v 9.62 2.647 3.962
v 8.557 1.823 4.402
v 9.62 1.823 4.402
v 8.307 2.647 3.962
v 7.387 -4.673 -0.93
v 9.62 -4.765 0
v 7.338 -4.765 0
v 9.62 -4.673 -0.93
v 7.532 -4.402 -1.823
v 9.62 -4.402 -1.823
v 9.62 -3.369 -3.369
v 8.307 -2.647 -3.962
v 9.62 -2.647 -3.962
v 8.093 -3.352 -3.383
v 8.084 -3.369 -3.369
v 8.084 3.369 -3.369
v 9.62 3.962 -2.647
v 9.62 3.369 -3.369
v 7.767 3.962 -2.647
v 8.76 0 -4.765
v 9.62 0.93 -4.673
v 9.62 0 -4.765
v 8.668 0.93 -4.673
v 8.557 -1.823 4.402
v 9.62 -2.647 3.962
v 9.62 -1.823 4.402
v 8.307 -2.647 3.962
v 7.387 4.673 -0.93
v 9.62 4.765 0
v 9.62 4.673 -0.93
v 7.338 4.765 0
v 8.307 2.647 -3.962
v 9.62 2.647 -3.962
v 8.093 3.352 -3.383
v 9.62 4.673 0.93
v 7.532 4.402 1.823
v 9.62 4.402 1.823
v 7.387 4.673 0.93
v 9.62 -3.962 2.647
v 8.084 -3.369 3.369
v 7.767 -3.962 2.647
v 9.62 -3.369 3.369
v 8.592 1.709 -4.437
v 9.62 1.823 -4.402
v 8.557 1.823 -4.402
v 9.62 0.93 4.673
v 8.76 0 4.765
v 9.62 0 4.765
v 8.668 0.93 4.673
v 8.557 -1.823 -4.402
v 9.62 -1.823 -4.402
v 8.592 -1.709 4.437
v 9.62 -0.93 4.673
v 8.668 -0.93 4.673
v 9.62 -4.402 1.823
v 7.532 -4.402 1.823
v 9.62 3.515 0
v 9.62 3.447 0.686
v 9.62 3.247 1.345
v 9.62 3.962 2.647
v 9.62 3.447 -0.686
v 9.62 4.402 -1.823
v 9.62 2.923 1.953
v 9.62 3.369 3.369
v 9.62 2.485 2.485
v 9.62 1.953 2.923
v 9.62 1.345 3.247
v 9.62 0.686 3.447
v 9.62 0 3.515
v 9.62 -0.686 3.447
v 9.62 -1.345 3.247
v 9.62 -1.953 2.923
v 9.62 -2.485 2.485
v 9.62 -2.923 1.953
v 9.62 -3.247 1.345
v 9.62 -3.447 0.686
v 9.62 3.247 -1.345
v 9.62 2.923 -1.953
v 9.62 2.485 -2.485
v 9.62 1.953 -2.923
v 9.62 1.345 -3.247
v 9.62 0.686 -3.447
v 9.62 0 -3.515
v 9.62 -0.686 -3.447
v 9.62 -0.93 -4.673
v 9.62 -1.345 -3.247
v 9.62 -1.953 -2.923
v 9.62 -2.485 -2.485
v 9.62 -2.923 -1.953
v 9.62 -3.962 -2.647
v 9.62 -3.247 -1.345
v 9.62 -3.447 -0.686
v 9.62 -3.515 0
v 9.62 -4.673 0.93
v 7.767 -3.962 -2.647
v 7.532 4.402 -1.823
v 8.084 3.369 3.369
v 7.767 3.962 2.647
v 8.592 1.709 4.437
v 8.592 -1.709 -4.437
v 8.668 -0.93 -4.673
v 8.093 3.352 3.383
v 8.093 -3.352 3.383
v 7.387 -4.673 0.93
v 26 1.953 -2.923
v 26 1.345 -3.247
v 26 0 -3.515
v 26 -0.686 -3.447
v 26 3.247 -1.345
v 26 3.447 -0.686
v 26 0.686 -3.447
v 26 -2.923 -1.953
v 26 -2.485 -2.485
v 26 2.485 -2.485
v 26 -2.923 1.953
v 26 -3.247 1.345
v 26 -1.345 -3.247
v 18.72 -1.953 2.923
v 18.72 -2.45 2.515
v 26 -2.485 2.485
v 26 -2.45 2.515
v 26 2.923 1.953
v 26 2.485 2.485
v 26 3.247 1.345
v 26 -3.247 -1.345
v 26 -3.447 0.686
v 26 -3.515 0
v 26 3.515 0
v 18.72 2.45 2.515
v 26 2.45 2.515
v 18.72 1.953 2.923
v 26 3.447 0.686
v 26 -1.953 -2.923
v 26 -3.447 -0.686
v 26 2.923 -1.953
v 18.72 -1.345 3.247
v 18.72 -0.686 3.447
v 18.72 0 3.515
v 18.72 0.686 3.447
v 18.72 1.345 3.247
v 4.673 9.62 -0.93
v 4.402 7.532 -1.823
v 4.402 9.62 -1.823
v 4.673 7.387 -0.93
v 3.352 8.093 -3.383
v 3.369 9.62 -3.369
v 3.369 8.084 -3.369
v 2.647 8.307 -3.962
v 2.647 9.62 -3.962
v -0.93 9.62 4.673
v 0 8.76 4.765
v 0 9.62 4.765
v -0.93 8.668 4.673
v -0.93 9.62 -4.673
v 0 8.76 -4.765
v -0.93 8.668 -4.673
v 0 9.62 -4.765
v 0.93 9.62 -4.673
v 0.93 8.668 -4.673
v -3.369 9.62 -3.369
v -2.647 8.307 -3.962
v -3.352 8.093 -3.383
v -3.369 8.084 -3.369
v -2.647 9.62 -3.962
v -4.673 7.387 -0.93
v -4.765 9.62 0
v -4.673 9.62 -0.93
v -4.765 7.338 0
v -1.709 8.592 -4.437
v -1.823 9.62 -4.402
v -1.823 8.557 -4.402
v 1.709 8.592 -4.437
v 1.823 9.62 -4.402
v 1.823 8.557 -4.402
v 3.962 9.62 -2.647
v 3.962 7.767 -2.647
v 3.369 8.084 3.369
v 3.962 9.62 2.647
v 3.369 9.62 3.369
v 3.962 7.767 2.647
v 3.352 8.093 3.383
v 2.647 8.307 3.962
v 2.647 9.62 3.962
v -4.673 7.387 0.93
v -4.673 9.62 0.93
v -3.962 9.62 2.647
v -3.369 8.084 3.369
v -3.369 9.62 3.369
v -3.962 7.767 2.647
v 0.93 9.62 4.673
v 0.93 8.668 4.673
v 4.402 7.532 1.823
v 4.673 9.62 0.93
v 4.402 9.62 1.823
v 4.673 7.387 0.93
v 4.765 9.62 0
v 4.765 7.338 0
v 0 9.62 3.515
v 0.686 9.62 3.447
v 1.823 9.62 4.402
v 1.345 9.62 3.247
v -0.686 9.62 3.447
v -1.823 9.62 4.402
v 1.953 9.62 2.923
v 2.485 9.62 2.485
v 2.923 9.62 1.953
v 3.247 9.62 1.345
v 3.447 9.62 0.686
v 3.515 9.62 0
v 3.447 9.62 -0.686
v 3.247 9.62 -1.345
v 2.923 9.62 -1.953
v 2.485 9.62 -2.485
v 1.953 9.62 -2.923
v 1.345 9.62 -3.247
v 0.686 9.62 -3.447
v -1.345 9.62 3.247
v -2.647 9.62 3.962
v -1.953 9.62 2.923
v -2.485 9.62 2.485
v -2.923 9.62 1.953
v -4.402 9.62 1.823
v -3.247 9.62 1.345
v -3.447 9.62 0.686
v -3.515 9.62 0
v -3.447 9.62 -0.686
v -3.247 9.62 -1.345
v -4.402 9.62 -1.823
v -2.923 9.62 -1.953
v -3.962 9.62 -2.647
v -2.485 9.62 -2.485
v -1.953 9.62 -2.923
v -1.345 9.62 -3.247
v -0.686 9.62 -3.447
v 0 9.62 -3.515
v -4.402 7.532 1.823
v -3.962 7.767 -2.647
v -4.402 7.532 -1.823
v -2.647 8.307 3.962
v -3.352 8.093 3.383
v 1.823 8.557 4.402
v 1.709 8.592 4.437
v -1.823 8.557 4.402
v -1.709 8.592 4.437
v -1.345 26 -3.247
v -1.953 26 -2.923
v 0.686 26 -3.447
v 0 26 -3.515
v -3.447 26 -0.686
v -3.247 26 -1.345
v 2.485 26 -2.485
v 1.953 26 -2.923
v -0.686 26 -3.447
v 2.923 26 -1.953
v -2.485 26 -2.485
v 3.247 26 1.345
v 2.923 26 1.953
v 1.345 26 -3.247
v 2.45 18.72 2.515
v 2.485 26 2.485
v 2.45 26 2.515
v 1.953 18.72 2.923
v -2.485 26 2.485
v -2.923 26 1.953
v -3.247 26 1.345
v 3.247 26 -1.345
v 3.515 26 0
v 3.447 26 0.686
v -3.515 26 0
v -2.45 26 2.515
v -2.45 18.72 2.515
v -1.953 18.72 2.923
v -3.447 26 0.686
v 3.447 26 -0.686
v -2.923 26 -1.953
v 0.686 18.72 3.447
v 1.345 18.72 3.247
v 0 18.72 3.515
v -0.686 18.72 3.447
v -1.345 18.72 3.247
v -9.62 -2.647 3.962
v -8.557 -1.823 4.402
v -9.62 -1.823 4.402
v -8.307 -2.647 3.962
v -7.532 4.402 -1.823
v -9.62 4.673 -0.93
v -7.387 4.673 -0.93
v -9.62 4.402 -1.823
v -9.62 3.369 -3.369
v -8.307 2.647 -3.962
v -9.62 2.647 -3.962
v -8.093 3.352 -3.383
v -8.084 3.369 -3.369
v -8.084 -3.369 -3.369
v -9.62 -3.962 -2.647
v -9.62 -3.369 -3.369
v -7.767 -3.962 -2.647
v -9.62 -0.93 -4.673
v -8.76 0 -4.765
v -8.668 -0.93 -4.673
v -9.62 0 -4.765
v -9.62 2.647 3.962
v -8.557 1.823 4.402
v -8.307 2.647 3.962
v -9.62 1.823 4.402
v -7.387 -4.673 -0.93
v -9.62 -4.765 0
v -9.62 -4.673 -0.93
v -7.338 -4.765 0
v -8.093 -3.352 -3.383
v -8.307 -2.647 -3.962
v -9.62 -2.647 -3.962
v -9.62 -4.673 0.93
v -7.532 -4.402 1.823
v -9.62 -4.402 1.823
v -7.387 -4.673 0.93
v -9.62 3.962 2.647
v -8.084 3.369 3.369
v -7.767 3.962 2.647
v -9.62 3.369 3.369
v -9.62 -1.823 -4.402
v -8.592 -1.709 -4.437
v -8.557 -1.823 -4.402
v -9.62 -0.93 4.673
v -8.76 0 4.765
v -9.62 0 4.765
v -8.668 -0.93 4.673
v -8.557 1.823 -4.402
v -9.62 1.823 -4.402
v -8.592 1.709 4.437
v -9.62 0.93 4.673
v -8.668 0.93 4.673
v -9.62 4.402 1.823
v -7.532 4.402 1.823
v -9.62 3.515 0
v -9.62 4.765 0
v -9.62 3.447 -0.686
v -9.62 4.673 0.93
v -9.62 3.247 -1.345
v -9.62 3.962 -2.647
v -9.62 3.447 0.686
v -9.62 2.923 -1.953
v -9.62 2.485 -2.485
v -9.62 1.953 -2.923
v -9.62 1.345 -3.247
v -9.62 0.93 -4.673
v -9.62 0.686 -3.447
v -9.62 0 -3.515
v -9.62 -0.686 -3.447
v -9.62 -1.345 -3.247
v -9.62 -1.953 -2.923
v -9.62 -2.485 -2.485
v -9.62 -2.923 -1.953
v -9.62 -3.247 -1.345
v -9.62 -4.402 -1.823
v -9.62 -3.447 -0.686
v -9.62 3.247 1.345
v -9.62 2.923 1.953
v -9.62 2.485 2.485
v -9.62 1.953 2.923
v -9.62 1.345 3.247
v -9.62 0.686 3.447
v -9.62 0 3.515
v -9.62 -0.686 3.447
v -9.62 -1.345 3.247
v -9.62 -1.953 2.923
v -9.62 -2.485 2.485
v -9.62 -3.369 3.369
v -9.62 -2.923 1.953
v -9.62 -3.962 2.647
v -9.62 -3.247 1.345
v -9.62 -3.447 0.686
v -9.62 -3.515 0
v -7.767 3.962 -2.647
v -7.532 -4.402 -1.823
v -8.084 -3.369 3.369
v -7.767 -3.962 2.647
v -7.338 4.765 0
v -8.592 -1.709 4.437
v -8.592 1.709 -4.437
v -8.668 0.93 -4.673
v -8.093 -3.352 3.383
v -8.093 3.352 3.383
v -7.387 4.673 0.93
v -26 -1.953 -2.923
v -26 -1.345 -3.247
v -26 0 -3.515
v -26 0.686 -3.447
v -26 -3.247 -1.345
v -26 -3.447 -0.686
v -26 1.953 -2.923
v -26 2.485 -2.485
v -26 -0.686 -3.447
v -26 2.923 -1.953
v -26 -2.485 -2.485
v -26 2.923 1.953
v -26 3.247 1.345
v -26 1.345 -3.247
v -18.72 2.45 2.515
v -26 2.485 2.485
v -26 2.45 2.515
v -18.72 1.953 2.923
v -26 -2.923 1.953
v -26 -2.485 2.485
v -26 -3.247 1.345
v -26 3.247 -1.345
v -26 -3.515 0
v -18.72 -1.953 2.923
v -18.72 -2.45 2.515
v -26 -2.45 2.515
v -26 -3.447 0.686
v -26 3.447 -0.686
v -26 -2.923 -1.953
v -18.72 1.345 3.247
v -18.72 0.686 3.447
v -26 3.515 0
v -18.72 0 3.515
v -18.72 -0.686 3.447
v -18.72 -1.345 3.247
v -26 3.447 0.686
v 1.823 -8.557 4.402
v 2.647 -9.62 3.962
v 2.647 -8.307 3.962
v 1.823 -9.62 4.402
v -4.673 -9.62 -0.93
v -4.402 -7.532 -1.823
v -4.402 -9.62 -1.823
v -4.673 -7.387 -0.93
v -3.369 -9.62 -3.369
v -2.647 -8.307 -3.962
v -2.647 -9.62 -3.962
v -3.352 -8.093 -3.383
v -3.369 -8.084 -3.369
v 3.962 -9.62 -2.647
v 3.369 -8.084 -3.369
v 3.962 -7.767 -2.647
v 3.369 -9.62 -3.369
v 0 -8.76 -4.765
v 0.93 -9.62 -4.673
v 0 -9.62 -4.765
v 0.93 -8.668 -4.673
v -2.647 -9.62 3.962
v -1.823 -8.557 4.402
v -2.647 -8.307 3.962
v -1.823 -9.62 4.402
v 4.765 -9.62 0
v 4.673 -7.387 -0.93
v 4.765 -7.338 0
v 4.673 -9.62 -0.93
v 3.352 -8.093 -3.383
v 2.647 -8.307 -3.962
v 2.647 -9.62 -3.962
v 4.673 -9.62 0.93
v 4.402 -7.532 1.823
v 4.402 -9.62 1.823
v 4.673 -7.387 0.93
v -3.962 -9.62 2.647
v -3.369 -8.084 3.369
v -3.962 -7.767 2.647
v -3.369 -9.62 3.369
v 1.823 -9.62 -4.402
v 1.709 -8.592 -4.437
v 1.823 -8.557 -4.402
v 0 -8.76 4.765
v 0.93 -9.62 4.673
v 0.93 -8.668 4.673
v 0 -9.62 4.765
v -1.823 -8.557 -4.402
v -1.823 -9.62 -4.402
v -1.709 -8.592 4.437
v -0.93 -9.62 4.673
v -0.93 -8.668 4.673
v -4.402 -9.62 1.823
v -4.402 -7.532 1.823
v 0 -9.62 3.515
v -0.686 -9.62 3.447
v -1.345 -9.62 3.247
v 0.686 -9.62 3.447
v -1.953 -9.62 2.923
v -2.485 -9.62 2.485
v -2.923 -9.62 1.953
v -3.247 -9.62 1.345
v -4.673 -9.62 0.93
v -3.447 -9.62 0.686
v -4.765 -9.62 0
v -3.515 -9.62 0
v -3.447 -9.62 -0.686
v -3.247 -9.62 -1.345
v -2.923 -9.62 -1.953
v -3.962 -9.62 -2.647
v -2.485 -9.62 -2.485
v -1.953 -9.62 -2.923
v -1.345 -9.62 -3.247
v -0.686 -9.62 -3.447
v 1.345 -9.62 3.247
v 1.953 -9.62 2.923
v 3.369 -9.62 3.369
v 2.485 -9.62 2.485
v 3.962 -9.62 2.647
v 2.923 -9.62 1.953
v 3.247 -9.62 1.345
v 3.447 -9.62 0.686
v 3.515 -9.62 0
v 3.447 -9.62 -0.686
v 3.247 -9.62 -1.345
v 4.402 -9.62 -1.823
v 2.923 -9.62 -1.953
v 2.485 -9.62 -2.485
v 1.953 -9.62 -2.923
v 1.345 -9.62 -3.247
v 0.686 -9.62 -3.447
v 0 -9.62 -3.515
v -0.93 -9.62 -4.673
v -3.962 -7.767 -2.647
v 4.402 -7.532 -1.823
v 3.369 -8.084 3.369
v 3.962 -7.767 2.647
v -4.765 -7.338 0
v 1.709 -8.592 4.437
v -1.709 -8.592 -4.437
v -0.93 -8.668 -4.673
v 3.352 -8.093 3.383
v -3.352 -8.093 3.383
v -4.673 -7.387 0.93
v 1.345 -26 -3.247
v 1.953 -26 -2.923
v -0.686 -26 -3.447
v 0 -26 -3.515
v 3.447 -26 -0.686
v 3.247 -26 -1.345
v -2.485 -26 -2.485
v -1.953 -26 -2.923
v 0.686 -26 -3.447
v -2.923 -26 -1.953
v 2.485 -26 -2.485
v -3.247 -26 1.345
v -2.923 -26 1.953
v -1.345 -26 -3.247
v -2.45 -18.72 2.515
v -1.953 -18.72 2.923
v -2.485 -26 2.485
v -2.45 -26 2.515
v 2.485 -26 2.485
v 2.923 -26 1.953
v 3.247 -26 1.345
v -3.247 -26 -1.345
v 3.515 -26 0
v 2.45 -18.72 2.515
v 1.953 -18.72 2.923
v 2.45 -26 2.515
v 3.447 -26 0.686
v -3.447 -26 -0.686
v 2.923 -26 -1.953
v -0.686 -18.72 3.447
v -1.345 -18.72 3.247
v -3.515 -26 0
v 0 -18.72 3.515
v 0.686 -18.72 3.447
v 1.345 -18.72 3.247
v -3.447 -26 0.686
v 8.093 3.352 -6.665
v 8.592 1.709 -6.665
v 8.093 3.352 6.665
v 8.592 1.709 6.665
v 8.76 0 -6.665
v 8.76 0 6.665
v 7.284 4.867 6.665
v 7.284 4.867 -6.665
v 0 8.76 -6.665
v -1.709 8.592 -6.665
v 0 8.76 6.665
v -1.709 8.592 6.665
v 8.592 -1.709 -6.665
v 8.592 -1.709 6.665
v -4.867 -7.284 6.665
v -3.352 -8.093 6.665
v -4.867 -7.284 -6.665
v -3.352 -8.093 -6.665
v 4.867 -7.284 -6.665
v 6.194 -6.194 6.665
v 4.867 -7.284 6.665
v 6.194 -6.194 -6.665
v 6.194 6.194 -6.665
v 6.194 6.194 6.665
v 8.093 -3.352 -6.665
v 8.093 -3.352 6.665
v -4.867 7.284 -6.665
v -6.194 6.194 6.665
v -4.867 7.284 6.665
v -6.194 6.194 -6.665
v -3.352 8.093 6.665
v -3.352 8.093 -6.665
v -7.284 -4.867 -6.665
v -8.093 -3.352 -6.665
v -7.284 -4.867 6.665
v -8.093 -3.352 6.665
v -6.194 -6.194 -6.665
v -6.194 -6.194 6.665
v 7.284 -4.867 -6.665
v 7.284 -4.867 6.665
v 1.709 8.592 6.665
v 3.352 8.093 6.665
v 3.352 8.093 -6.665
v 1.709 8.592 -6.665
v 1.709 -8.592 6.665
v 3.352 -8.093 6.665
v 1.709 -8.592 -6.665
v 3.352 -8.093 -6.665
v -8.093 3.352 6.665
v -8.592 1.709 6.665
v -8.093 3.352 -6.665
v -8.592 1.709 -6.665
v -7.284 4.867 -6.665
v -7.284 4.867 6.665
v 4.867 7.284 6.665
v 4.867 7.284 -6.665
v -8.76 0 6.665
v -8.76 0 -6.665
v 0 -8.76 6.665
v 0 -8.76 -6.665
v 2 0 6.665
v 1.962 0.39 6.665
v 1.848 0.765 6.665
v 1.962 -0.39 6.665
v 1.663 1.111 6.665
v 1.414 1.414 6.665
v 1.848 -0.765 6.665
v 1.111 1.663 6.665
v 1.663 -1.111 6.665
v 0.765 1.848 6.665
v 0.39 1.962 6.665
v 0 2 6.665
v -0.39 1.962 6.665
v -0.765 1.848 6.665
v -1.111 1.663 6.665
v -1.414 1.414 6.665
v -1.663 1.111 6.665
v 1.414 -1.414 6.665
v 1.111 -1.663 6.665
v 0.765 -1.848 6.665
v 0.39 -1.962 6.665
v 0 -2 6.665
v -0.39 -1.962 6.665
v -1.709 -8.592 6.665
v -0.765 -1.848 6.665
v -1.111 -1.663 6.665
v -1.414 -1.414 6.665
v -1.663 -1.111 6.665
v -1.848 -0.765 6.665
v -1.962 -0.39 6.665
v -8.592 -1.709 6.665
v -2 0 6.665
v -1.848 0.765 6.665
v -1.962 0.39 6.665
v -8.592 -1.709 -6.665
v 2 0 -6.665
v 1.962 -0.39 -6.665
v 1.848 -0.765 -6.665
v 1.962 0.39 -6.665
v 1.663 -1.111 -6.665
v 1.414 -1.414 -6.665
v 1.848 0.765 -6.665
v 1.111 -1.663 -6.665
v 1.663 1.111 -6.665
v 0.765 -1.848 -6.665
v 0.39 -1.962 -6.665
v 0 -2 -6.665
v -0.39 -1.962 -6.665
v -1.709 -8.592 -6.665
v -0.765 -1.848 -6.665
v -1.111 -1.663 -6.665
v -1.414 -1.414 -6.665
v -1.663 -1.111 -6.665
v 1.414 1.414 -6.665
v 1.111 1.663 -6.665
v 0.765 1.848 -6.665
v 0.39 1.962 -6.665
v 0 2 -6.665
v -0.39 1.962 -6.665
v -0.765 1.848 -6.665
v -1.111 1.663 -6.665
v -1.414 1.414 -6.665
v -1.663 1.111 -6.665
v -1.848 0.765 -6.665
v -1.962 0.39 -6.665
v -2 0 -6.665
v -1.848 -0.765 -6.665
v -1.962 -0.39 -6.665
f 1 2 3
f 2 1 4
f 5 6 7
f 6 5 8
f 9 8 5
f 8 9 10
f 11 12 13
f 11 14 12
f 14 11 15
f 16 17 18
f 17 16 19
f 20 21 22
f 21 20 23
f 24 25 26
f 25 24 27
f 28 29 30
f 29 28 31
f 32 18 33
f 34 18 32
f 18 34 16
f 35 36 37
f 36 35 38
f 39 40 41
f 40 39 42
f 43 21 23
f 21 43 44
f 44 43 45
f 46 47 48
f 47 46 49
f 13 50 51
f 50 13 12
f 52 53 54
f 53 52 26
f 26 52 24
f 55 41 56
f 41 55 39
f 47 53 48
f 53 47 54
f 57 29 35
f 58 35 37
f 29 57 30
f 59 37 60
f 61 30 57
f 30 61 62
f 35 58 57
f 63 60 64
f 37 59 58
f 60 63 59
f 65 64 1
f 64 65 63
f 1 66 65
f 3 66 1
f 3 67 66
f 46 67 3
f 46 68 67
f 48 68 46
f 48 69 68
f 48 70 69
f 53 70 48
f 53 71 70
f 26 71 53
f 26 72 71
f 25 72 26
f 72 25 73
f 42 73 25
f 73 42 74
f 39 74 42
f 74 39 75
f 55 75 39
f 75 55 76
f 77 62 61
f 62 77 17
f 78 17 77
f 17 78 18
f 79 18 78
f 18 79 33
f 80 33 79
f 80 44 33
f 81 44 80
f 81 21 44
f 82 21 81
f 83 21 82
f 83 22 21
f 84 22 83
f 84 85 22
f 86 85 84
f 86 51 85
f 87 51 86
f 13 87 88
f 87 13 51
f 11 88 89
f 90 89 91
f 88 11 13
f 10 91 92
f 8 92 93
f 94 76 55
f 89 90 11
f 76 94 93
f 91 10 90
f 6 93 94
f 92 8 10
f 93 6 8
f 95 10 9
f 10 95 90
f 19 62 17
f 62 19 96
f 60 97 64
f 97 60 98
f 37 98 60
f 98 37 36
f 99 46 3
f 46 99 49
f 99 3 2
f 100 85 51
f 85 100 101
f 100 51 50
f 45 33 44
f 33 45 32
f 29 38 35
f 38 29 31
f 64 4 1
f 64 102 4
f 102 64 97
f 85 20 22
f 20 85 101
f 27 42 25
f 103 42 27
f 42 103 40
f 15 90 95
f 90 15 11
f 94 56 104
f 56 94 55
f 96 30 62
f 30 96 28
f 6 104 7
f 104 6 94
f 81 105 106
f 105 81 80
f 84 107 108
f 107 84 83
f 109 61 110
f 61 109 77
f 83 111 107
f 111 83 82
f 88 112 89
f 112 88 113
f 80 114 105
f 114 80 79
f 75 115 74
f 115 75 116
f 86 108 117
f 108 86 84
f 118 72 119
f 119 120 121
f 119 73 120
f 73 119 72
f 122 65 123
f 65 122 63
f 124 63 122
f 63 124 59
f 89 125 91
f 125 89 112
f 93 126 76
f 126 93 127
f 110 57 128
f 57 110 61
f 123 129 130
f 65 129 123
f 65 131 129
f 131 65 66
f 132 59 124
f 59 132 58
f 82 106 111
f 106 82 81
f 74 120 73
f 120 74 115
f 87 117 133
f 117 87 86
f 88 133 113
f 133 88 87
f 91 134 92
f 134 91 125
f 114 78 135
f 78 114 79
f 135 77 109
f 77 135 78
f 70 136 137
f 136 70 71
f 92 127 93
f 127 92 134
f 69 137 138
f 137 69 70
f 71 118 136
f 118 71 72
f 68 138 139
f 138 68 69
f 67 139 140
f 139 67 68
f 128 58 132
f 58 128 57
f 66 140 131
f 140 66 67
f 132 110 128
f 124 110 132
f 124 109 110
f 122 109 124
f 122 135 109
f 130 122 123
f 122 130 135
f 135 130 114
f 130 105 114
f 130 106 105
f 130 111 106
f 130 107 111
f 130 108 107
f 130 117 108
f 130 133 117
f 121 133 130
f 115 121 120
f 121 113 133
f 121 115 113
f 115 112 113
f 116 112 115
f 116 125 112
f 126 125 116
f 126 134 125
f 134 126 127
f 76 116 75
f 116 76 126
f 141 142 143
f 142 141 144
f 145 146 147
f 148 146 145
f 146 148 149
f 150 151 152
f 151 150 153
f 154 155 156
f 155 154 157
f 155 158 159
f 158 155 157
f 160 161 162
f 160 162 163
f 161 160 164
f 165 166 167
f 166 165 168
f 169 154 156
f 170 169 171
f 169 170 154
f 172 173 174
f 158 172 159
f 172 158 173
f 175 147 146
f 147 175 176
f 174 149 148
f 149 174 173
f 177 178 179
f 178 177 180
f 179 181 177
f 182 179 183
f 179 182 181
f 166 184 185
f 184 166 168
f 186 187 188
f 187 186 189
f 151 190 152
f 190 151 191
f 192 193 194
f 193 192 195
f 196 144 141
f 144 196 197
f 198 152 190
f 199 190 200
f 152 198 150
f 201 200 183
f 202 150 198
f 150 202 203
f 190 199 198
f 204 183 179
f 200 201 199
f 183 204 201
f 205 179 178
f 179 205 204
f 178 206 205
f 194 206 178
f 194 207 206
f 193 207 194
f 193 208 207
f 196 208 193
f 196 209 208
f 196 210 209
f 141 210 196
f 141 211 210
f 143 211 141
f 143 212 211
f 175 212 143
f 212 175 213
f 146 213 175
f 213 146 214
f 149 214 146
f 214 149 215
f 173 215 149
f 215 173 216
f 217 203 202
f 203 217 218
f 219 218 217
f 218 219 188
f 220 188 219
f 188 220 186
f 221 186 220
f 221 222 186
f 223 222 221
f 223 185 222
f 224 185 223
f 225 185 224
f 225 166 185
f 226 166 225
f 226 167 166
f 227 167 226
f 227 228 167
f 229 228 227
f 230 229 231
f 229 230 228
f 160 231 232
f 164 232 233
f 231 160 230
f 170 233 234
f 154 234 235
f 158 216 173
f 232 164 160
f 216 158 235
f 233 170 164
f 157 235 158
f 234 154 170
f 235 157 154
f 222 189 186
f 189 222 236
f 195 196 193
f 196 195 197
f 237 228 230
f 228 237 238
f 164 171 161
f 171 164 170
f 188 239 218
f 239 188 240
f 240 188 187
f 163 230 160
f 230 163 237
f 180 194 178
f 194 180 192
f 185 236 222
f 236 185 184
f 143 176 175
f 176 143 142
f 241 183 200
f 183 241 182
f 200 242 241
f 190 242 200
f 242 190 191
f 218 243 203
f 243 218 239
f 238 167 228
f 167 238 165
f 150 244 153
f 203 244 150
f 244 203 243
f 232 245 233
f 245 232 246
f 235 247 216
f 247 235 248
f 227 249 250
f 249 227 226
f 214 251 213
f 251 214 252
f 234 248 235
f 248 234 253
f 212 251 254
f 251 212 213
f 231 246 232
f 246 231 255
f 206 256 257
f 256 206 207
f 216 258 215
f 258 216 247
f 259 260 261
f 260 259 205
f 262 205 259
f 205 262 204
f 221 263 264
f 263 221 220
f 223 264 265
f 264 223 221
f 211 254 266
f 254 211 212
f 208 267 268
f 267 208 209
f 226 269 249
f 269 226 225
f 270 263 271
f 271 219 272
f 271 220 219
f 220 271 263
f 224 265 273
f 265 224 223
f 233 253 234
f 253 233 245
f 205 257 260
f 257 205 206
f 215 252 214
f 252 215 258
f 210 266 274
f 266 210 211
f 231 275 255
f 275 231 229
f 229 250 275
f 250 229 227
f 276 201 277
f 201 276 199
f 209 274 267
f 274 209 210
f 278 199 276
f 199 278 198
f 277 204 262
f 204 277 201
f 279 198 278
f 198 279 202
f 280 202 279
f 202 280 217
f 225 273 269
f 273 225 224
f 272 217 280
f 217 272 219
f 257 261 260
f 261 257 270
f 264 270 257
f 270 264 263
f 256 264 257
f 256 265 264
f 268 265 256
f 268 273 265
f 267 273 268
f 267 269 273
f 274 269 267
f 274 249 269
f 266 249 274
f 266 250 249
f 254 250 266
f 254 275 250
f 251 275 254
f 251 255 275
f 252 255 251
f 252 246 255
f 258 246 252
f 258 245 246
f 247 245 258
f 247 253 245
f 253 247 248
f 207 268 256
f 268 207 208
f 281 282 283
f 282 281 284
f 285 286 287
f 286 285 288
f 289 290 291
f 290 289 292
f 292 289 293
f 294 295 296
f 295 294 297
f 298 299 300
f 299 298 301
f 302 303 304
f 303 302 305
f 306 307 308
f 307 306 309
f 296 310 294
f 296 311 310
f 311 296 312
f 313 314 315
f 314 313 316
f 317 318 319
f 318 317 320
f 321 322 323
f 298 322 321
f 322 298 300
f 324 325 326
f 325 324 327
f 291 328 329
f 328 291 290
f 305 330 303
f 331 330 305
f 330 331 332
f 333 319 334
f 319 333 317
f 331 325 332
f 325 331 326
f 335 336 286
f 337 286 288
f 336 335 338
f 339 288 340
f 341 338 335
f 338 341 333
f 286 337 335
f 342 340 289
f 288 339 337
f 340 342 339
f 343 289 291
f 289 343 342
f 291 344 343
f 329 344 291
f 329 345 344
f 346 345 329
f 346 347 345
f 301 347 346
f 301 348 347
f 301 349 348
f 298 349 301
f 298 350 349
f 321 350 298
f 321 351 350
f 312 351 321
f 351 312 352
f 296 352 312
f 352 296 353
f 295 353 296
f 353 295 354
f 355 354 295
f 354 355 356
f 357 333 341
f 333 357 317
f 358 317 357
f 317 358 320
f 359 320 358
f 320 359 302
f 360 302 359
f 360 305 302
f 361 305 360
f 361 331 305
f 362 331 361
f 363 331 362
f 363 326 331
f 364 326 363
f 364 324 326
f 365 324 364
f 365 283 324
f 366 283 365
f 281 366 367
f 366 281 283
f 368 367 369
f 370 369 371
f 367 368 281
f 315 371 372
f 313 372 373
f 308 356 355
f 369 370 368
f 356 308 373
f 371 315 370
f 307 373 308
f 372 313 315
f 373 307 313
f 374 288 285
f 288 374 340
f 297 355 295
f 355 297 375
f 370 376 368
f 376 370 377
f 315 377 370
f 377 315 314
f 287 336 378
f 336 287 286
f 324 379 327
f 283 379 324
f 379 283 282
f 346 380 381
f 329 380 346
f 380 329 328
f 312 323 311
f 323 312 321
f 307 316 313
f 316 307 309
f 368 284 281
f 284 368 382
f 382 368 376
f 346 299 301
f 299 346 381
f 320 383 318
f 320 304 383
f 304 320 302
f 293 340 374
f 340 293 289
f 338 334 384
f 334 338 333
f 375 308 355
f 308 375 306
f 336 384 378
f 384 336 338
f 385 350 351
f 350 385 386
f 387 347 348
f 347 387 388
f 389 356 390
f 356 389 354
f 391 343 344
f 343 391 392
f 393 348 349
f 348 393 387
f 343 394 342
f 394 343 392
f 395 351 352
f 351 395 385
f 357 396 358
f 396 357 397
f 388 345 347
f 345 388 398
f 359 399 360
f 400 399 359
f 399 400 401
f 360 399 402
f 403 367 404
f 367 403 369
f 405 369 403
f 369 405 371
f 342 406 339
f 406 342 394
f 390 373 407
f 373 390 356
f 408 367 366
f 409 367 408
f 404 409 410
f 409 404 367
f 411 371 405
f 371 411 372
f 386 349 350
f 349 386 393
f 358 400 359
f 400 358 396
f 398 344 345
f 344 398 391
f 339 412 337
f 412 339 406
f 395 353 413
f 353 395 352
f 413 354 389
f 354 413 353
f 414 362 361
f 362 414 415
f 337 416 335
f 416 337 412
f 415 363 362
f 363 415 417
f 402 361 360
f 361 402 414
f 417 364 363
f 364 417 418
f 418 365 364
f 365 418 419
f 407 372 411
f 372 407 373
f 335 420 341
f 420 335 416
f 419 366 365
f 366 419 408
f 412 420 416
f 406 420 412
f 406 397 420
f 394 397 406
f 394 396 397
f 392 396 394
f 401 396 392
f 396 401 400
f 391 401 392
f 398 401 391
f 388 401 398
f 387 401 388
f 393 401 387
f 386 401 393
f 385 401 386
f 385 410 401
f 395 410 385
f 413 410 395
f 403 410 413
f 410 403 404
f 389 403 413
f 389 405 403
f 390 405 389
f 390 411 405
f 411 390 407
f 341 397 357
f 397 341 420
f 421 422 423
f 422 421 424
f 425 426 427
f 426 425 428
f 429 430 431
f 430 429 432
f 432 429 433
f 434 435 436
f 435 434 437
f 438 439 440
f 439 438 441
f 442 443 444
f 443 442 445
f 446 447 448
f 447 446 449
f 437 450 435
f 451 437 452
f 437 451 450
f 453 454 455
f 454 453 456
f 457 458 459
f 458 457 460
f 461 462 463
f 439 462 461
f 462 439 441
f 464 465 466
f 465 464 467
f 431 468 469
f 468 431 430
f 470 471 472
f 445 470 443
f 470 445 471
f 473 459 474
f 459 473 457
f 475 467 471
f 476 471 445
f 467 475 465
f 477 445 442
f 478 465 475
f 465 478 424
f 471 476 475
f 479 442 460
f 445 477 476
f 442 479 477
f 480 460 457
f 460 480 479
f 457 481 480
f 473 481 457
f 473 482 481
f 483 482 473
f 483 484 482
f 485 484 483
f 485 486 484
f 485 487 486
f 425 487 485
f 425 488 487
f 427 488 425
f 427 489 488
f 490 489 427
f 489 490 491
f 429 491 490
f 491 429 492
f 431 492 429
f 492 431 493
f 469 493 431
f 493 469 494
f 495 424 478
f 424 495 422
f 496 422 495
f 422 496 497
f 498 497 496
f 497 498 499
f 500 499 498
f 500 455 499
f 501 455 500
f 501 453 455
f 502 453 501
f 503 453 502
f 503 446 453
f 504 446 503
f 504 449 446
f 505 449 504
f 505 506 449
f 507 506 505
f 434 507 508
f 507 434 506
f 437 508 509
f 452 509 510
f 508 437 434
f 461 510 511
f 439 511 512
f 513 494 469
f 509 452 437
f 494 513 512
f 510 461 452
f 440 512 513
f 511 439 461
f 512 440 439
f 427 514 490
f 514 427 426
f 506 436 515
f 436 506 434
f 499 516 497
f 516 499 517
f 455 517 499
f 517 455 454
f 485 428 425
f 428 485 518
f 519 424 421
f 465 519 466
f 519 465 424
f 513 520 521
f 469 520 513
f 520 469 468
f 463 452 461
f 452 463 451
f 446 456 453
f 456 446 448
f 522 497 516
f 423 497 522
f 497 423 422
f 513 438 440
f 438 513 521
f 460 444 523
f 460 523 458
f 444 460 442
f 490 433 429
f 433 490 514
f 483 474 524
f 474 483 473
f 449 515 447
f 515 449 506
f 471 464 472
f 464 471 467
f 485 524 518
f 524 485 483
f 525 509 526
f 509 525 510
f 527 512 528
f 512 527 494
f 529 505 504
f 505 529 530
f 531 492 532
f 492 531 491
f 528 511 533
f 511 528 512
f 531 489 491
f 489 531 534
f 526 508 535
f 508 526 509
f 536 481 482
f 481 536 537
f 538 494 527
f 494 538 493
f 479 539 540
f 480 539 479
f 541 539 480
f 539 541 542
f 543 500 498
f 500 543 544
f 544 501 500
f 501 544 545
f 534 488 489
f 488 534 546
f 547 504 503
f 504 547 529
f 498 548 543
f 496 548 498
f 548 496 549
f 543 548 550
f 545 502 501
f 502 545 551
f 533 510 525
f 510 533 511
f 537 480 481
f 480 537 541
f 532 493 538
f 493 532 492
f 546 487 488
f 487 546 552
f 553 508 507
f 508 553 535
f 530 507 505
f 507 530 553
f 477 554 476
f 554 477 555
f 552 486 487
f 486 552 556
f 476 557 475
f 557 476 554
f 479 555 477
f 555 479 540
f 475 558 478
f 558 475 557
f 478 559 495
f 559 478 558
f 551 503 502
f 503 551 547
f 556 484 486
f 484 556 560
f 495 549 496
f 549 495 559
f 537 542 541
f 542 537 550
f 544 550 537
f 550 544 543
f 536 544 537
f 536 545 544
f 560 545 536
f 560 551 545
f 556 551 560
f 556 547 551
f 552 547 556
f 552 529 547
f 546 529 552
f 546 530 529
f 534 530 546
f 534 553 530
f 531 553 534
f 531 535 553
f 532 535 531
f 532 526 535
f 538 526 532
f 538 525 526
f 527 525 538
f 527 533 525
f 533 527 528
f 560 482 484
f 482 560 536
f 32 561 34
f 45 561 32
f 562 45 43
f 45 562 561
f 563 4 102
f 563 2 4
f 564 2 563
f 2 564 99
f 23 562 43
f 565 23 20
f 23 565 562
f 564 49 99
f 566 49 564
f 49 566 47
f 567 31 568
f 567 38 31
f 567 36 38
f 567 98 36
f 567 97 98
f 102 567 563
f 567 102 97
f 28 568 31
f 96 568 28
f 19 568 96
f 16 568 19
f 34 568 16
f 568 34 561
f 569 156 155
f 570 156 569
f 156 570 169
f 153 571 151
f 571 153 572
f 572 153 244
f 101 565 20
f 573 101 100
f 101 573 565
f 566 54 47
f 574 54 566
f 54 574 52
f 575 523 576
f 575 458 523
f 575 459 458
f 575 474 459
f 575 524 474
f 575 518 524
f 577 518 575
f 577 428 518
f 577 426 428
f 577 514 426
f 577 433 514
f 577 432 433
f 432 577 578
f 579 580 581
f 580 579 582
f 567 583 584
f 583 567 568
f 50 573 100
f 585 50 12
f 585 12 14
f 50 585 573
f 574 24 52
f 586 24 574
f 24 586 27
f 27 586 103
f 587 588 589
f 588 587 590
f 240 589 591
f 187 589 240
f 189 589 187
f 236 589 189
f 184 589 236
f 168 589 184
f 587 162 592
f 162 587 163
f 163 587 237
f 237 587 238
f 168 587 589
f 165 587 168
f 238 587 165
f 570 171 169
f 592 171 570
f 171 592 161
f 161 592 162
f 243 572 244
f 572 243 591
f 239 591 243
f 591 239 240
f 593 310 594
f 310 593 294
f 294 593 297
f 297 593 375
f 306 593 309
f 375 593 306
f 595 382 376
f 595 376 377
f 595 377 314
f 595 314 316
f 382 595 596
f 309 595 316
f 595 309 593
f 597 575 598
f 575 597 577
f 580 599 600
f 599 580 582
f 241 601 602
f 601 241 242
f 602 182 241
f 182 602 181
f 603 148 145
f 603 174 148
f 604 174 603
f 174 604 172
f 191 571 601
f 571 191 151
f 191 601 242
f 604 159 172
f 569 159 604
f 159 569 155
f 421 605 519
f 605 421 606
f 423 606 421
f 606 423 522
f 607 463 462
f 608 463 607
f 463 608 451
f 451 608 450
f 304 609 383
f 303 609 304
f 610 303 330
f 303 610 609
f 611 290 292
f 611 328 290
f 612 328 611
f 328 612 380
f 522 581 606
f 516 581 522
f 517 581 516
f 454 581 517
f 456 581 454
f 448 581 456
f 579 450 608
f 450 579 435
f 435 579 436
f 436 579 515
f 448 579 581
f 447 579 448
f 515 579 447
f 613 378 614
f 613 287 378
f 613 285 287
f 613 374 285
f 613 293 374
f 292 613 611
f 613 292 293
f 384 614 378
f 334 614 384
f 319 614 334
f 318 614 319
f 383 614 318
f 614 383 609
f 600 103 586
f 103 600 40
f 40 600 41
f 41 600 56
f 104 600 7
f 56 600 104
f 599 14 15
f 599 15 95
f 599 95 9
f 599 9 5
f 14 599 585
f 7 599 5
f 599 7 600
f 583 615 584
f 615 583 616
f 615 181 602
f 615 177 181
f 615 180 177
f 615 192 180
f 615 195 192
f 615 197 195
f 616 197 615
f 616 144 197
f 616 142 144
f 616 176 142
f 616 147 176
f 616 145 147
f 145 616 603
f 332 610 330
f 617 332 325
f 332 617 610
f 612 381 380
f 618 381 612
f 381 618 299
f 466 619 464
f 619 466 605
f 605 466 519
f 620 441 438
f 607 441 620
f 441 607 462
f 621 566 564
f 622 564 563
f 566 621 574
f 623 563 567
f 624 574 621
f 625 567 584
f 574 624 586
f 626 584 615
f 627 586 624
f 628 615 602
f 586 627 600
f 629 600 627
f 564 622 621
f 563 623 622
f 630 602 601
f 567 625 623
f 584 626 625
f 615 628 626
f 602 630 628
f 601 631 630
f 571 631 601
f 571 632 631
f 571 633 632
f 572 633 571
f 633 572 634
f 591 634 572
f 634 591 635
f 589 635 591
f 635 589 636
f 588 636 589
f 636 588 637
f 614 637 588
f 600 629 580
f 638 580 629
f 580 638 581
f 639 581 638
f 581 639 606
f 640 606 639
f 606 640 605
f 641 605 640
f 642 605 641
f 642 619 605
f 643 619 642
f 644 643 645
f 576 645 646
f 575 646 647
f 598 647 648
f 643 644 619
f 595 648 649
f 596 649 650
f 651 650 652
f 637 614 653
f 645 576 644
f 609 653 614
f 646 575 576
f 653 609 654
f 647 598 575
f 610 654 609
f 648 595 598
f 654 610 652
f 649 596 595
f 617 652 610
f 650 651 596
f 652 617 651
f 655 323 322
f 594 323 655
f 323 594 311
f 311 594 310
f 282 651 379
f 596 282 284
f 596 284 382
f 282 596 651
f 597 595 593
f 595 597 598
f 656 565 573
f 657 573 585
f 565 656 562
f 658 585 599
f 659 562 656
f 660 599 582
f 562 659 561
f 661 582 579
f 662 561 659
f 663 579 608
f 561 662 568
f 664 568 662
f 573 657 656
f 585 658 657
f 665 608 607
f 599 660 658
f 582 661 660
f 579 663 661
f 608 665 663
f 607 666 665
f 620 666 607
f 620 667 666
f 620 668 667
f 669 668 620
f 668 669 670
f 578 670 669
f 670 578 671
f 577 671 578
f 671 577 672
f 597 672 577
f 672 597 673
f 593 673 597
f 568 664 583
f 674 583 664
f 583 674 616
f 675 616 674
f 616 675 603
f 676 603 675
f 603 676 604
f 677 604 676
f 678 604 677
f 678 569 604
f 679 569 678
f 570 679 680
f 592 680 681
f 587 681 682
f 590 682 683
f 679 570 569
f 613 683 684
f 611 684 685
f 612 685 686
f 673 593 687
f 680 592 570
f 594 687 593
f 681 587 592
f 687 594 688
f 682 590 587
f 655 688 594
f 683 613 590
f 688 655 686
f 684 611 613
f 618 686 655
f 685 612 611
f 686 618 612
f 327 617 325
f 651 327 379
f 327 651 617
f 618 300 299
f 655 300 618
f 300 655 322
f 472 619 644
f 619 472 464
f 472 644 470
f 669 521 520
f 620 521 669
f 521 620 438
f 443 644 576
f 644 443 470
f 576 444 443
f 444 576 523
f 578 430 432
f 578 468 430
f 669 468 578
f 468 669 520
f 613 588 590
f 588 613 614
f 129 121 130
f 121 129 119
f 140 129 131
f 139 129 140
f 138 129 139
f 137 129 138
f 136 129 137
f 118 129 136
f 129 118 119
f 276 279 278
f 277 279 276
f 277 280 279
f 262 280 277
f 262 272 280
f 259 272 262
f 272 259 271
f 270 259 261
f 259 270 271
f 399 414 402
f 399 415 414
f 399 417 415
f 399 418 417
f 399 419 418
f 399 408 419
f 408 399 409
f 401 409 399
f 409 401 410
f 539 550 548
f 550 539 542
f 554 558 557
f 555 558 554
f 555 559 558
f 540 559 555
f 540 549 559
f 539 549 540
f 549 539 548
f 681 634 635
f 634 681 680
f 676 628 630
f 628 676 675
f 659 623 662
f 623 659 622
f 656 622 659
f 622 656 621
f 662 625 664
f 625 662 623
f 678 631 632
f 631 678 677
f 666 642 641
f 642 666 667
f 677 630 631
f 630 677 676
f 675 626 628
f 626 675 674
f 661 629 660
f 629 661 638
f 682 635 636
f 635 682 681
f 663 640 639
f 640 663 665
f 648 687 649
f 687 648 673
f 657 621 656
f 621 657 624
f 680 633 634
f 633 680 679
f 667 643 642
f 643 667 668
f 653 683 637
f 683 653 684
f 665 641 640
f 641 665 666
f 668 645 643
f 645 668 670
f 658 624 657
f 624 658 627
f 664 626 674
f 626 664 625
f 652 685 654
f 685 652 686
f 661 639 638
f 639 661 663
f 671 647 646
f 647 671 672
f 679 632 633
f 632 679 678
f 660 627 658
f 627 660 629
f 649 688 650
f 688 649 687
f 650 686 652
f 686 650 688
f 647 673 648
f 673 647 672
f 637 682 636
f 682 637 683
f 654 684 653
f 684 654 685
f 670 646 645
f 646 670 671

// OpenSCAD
$fn = 32;

// ----------------------------------------------------------------------
// Cardan cross: 52 mm span, 9.53 mm trunnions
// ----------------------------------------------------------------------

// --- parameters (mm) ---
journal_d = 9.53;         // trunnion diameter
arm_len = 26;             // trunnion length from the centre
step_r = 3.24;            // step position from the centre
step_d = 7.03;            // journal diameter after the step
hub_d = 17.52;            // hub diameter
hub_h = 13.33;            // hub height
bore_d = 4;               // hub bore
flat_d = 1;               // depth of the journal flat
flat_len = 7.28;          // length of the journal flat

difference() {
  union() {
    /* hub along the joint axis */
    cylinder(h = hub_h, d = hub_d, center = true);
    for (a = [0 : 90 : 270]) rotate([0, 0, a]) {
      /* trunnion, sunk into the hub */
      translate([hub_d / 4, 0, 0]) rotate([0, 90, 0]) cylinder(h = step_r + 2, d = journal_d);
      /* stepped journal out to the tip */
      translate([step_r - 0.5, 0, 0]) rotate([0, 90, 0]) cylinder(h = arm_len + 0.5 - step_r, d = step_d);
    }
  }
  /* lubrication bore through the hub, 2.5 mm clear on both sides */
  translate([0, 0, -hub_h / 2 - 2.5]) cylinder(h = hub_h + 5, d = bore_d);
  /* machined flat on each journal tip */
  for (a = [0 : 90 : 270]) rotate([0, 0, a]) {
    translate([arm_len - flat_len, -step_d, step_d / 2 - flat_d]) cube([flat_len + 0.5, 2 * step_d, flat_d + 2.5]);
  }
}
